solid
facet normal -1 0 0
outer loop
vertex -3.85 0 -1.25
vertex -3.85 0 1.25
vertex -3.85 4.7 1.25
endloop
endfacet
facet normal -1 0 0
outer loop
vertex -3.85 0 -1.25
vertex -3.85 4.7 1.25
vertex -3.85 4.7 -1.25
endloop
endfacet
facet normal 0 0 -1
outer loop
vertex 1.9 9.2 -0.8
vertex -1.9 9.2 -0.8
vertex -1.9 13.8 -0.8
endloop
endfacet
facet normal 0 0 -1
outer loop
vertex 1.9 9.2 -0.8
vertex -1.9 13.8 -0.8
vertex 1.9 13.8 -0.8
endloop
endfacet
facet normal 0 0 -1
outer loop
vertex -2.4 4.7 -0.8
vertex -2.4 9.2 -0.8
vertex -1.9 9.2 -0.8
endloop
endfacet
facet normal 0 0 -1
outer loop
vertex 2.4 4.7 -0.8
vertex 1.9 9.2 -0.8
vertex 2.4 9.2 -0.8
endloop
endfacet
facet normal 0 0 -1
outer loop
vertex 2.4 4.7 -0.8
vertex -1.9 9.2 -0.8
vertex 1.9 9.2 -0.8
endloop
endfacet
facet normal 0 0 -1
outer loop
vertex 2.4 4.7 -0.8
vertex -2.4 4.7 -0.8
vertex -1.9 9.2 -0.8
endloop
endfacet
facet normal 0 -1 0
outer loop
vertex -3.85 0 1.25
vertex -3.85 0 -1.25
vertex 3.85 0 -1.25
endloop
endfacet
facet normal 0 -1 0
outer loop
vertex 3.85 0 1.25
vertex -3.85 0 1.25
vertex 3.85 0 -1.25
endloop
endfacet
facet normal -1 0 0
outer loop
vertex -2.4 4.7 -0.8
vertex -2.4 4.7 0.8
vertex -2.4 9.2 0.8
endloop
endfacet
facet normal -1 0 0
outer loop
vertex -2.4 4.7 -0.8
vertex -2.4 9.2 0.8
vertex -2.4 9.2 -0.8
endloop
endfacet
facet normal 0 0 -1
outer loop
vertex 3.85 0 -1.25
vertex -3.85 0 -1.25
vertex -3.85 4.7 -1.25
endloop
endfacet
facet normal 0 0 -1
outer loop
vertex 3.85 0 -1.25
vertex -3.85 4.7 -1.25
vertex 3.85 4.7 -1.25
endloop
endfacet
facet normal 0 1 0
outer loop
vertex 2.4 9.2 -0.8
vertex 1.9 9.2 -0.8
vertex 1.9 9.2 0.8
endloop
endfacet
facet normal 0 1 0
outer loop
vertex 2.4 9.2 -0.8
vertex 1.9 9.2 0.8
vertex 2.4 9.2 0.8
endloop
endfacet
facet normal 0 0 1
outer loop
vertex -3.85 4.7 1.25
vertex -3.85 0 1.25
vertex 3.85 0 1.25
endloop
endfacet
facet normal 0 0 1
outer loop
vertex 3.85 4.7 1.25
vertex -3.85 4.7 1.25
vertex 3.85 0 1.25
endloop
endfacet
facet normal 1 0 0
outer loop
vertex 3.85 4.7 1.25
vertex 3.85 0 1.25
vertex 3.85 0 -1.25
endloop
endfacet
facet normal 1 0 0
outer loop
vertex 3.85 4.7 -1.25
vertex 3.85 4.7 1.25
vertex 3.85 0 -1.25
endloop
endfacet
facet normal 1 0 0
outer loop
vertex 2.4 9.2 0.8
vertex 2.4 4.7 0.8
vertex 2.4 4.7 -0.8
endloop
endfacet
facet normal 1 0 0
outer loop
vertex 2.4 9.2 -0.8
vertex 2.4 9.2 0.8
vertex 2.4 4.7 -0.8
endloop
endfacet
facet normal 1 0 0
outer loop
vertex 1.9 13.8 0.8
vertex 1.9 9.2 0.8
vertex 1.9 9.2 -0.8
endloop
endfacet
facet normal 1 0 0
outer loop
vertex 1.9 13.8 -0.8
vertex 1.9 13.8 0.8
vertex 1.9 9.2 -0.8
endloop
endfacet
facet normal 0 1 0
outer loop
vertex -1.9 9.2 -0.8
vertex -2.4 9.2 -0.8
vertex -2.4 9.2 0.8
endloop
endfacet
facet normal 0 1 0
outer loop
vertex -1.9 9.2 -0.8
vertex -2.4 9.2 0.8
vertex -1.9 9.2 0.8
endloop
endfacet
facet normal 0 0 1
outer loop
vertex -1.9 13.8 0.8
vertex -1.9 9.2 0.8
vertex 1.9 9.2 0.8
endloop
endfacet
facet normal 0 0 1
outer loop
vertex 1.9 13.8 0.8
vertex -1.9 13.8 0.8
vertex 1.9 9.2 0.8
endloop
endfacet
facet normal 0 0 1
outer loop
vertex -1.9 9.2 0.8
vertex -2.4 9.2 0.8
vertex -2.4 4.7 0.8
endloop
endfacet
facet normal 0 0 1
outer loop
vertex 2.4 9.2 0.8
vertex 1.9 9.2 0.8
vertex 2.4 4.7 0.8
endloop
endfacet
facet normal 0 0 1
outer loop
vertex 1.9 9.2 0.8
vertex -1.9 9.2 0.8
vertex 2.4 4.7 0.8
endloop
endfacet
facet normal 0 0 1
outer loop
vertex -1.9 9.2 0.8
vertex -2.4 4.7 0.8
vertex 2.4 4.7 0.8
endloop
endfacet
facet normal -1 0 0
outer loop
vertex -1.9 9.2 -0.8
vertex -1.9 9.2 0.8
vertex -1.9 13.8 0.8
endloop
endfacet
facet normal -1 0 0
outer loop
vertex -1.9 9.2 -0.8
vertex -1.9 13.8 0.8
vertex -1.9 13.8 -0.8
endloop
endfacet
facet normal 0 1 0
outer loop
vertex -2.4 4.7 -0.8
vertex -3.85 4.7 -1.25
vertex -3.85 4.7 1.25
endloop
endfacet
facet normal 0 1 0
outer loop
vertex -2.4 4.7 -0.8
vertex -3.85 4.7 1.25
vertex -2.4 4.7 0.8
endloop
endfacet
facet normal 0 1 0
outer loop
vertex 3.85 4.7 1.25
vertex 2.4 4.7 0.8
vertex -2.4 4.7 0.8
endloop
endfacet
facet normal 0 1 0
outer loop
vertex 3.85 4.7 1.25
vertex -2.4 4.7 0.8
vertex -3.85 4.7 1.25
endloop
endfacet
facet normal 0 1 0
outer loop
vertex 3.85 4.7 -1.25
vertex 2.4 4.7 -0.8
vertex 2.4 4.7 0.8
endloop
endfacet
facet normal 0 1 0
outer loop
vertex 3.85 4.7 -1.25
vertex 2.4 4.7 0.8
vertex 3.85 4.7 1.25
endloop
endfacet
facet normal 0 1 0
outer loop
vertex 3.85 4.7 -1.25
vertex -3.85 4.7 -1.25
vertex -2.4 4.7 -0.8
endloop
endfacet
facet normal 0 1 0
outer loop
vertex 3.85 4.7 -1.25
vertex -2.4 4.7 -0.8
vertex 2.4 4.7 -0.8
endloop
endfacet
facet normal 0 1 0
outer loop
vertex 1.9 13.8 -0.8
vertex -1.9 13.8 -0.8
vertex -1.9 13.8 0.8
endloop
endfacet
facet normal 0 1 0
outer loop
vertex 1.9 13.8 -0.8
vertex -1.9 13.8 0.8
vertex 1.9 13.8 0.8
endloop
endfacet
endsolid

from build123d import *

# Parameters (mm, degrees)
SKETCH1_W           = 7.7
SKETCH1_H           = 2.5
BOSS_EXTRUDE1_DEPTH = 4.7
SKETCH2_W           = 4.8
SKETCH2_H           = 1.6
BOSS_EXTRUDE2_DEPTH = 4.5
SKETCH3_W           = 3.8
SKETCH3_H           = 1.6
BOSS_EXTRUDE3_DEPTH = 4.6


with BuildPart() as part:
    # Sketch1 → Boss-Extrude1 (new body)
    with BuildSketch(Plane(origin=(0, 0, 0), x_dir=(1, 0, 0), z_dir=(0, 1, 0))):
        Rectangle(SKETCH1_W, SKETCH1_H)
    extrude(amount=BOSS_EXTRUDE1_DEPTH)

    # Sketch2 → Boss-Extrude2 (add)
    with BuildSketch(Plane(origin=(0, 4.7, 0), x_dir=(1, 0, 0), z_dir=(0, 1, 0))):
        Rectangle(SKETCH2_W, SKETCH2_H)
    extrude(amount=BOSS_EXTRUDE2_DEPTH)

    # Sketch3 → Boss-Extrude3 (add)
    with BuildSketch(Plane(origin=(0, 9.2, 0), x_dir=(1, 0, 0), z_dir=(0, 1, 0))):
        Rectangle(SKETCH3_W, SKETCH3_H)
    extrude(amount=BOSS_EXTRUDE3_DEPTH)


solid = part.part
